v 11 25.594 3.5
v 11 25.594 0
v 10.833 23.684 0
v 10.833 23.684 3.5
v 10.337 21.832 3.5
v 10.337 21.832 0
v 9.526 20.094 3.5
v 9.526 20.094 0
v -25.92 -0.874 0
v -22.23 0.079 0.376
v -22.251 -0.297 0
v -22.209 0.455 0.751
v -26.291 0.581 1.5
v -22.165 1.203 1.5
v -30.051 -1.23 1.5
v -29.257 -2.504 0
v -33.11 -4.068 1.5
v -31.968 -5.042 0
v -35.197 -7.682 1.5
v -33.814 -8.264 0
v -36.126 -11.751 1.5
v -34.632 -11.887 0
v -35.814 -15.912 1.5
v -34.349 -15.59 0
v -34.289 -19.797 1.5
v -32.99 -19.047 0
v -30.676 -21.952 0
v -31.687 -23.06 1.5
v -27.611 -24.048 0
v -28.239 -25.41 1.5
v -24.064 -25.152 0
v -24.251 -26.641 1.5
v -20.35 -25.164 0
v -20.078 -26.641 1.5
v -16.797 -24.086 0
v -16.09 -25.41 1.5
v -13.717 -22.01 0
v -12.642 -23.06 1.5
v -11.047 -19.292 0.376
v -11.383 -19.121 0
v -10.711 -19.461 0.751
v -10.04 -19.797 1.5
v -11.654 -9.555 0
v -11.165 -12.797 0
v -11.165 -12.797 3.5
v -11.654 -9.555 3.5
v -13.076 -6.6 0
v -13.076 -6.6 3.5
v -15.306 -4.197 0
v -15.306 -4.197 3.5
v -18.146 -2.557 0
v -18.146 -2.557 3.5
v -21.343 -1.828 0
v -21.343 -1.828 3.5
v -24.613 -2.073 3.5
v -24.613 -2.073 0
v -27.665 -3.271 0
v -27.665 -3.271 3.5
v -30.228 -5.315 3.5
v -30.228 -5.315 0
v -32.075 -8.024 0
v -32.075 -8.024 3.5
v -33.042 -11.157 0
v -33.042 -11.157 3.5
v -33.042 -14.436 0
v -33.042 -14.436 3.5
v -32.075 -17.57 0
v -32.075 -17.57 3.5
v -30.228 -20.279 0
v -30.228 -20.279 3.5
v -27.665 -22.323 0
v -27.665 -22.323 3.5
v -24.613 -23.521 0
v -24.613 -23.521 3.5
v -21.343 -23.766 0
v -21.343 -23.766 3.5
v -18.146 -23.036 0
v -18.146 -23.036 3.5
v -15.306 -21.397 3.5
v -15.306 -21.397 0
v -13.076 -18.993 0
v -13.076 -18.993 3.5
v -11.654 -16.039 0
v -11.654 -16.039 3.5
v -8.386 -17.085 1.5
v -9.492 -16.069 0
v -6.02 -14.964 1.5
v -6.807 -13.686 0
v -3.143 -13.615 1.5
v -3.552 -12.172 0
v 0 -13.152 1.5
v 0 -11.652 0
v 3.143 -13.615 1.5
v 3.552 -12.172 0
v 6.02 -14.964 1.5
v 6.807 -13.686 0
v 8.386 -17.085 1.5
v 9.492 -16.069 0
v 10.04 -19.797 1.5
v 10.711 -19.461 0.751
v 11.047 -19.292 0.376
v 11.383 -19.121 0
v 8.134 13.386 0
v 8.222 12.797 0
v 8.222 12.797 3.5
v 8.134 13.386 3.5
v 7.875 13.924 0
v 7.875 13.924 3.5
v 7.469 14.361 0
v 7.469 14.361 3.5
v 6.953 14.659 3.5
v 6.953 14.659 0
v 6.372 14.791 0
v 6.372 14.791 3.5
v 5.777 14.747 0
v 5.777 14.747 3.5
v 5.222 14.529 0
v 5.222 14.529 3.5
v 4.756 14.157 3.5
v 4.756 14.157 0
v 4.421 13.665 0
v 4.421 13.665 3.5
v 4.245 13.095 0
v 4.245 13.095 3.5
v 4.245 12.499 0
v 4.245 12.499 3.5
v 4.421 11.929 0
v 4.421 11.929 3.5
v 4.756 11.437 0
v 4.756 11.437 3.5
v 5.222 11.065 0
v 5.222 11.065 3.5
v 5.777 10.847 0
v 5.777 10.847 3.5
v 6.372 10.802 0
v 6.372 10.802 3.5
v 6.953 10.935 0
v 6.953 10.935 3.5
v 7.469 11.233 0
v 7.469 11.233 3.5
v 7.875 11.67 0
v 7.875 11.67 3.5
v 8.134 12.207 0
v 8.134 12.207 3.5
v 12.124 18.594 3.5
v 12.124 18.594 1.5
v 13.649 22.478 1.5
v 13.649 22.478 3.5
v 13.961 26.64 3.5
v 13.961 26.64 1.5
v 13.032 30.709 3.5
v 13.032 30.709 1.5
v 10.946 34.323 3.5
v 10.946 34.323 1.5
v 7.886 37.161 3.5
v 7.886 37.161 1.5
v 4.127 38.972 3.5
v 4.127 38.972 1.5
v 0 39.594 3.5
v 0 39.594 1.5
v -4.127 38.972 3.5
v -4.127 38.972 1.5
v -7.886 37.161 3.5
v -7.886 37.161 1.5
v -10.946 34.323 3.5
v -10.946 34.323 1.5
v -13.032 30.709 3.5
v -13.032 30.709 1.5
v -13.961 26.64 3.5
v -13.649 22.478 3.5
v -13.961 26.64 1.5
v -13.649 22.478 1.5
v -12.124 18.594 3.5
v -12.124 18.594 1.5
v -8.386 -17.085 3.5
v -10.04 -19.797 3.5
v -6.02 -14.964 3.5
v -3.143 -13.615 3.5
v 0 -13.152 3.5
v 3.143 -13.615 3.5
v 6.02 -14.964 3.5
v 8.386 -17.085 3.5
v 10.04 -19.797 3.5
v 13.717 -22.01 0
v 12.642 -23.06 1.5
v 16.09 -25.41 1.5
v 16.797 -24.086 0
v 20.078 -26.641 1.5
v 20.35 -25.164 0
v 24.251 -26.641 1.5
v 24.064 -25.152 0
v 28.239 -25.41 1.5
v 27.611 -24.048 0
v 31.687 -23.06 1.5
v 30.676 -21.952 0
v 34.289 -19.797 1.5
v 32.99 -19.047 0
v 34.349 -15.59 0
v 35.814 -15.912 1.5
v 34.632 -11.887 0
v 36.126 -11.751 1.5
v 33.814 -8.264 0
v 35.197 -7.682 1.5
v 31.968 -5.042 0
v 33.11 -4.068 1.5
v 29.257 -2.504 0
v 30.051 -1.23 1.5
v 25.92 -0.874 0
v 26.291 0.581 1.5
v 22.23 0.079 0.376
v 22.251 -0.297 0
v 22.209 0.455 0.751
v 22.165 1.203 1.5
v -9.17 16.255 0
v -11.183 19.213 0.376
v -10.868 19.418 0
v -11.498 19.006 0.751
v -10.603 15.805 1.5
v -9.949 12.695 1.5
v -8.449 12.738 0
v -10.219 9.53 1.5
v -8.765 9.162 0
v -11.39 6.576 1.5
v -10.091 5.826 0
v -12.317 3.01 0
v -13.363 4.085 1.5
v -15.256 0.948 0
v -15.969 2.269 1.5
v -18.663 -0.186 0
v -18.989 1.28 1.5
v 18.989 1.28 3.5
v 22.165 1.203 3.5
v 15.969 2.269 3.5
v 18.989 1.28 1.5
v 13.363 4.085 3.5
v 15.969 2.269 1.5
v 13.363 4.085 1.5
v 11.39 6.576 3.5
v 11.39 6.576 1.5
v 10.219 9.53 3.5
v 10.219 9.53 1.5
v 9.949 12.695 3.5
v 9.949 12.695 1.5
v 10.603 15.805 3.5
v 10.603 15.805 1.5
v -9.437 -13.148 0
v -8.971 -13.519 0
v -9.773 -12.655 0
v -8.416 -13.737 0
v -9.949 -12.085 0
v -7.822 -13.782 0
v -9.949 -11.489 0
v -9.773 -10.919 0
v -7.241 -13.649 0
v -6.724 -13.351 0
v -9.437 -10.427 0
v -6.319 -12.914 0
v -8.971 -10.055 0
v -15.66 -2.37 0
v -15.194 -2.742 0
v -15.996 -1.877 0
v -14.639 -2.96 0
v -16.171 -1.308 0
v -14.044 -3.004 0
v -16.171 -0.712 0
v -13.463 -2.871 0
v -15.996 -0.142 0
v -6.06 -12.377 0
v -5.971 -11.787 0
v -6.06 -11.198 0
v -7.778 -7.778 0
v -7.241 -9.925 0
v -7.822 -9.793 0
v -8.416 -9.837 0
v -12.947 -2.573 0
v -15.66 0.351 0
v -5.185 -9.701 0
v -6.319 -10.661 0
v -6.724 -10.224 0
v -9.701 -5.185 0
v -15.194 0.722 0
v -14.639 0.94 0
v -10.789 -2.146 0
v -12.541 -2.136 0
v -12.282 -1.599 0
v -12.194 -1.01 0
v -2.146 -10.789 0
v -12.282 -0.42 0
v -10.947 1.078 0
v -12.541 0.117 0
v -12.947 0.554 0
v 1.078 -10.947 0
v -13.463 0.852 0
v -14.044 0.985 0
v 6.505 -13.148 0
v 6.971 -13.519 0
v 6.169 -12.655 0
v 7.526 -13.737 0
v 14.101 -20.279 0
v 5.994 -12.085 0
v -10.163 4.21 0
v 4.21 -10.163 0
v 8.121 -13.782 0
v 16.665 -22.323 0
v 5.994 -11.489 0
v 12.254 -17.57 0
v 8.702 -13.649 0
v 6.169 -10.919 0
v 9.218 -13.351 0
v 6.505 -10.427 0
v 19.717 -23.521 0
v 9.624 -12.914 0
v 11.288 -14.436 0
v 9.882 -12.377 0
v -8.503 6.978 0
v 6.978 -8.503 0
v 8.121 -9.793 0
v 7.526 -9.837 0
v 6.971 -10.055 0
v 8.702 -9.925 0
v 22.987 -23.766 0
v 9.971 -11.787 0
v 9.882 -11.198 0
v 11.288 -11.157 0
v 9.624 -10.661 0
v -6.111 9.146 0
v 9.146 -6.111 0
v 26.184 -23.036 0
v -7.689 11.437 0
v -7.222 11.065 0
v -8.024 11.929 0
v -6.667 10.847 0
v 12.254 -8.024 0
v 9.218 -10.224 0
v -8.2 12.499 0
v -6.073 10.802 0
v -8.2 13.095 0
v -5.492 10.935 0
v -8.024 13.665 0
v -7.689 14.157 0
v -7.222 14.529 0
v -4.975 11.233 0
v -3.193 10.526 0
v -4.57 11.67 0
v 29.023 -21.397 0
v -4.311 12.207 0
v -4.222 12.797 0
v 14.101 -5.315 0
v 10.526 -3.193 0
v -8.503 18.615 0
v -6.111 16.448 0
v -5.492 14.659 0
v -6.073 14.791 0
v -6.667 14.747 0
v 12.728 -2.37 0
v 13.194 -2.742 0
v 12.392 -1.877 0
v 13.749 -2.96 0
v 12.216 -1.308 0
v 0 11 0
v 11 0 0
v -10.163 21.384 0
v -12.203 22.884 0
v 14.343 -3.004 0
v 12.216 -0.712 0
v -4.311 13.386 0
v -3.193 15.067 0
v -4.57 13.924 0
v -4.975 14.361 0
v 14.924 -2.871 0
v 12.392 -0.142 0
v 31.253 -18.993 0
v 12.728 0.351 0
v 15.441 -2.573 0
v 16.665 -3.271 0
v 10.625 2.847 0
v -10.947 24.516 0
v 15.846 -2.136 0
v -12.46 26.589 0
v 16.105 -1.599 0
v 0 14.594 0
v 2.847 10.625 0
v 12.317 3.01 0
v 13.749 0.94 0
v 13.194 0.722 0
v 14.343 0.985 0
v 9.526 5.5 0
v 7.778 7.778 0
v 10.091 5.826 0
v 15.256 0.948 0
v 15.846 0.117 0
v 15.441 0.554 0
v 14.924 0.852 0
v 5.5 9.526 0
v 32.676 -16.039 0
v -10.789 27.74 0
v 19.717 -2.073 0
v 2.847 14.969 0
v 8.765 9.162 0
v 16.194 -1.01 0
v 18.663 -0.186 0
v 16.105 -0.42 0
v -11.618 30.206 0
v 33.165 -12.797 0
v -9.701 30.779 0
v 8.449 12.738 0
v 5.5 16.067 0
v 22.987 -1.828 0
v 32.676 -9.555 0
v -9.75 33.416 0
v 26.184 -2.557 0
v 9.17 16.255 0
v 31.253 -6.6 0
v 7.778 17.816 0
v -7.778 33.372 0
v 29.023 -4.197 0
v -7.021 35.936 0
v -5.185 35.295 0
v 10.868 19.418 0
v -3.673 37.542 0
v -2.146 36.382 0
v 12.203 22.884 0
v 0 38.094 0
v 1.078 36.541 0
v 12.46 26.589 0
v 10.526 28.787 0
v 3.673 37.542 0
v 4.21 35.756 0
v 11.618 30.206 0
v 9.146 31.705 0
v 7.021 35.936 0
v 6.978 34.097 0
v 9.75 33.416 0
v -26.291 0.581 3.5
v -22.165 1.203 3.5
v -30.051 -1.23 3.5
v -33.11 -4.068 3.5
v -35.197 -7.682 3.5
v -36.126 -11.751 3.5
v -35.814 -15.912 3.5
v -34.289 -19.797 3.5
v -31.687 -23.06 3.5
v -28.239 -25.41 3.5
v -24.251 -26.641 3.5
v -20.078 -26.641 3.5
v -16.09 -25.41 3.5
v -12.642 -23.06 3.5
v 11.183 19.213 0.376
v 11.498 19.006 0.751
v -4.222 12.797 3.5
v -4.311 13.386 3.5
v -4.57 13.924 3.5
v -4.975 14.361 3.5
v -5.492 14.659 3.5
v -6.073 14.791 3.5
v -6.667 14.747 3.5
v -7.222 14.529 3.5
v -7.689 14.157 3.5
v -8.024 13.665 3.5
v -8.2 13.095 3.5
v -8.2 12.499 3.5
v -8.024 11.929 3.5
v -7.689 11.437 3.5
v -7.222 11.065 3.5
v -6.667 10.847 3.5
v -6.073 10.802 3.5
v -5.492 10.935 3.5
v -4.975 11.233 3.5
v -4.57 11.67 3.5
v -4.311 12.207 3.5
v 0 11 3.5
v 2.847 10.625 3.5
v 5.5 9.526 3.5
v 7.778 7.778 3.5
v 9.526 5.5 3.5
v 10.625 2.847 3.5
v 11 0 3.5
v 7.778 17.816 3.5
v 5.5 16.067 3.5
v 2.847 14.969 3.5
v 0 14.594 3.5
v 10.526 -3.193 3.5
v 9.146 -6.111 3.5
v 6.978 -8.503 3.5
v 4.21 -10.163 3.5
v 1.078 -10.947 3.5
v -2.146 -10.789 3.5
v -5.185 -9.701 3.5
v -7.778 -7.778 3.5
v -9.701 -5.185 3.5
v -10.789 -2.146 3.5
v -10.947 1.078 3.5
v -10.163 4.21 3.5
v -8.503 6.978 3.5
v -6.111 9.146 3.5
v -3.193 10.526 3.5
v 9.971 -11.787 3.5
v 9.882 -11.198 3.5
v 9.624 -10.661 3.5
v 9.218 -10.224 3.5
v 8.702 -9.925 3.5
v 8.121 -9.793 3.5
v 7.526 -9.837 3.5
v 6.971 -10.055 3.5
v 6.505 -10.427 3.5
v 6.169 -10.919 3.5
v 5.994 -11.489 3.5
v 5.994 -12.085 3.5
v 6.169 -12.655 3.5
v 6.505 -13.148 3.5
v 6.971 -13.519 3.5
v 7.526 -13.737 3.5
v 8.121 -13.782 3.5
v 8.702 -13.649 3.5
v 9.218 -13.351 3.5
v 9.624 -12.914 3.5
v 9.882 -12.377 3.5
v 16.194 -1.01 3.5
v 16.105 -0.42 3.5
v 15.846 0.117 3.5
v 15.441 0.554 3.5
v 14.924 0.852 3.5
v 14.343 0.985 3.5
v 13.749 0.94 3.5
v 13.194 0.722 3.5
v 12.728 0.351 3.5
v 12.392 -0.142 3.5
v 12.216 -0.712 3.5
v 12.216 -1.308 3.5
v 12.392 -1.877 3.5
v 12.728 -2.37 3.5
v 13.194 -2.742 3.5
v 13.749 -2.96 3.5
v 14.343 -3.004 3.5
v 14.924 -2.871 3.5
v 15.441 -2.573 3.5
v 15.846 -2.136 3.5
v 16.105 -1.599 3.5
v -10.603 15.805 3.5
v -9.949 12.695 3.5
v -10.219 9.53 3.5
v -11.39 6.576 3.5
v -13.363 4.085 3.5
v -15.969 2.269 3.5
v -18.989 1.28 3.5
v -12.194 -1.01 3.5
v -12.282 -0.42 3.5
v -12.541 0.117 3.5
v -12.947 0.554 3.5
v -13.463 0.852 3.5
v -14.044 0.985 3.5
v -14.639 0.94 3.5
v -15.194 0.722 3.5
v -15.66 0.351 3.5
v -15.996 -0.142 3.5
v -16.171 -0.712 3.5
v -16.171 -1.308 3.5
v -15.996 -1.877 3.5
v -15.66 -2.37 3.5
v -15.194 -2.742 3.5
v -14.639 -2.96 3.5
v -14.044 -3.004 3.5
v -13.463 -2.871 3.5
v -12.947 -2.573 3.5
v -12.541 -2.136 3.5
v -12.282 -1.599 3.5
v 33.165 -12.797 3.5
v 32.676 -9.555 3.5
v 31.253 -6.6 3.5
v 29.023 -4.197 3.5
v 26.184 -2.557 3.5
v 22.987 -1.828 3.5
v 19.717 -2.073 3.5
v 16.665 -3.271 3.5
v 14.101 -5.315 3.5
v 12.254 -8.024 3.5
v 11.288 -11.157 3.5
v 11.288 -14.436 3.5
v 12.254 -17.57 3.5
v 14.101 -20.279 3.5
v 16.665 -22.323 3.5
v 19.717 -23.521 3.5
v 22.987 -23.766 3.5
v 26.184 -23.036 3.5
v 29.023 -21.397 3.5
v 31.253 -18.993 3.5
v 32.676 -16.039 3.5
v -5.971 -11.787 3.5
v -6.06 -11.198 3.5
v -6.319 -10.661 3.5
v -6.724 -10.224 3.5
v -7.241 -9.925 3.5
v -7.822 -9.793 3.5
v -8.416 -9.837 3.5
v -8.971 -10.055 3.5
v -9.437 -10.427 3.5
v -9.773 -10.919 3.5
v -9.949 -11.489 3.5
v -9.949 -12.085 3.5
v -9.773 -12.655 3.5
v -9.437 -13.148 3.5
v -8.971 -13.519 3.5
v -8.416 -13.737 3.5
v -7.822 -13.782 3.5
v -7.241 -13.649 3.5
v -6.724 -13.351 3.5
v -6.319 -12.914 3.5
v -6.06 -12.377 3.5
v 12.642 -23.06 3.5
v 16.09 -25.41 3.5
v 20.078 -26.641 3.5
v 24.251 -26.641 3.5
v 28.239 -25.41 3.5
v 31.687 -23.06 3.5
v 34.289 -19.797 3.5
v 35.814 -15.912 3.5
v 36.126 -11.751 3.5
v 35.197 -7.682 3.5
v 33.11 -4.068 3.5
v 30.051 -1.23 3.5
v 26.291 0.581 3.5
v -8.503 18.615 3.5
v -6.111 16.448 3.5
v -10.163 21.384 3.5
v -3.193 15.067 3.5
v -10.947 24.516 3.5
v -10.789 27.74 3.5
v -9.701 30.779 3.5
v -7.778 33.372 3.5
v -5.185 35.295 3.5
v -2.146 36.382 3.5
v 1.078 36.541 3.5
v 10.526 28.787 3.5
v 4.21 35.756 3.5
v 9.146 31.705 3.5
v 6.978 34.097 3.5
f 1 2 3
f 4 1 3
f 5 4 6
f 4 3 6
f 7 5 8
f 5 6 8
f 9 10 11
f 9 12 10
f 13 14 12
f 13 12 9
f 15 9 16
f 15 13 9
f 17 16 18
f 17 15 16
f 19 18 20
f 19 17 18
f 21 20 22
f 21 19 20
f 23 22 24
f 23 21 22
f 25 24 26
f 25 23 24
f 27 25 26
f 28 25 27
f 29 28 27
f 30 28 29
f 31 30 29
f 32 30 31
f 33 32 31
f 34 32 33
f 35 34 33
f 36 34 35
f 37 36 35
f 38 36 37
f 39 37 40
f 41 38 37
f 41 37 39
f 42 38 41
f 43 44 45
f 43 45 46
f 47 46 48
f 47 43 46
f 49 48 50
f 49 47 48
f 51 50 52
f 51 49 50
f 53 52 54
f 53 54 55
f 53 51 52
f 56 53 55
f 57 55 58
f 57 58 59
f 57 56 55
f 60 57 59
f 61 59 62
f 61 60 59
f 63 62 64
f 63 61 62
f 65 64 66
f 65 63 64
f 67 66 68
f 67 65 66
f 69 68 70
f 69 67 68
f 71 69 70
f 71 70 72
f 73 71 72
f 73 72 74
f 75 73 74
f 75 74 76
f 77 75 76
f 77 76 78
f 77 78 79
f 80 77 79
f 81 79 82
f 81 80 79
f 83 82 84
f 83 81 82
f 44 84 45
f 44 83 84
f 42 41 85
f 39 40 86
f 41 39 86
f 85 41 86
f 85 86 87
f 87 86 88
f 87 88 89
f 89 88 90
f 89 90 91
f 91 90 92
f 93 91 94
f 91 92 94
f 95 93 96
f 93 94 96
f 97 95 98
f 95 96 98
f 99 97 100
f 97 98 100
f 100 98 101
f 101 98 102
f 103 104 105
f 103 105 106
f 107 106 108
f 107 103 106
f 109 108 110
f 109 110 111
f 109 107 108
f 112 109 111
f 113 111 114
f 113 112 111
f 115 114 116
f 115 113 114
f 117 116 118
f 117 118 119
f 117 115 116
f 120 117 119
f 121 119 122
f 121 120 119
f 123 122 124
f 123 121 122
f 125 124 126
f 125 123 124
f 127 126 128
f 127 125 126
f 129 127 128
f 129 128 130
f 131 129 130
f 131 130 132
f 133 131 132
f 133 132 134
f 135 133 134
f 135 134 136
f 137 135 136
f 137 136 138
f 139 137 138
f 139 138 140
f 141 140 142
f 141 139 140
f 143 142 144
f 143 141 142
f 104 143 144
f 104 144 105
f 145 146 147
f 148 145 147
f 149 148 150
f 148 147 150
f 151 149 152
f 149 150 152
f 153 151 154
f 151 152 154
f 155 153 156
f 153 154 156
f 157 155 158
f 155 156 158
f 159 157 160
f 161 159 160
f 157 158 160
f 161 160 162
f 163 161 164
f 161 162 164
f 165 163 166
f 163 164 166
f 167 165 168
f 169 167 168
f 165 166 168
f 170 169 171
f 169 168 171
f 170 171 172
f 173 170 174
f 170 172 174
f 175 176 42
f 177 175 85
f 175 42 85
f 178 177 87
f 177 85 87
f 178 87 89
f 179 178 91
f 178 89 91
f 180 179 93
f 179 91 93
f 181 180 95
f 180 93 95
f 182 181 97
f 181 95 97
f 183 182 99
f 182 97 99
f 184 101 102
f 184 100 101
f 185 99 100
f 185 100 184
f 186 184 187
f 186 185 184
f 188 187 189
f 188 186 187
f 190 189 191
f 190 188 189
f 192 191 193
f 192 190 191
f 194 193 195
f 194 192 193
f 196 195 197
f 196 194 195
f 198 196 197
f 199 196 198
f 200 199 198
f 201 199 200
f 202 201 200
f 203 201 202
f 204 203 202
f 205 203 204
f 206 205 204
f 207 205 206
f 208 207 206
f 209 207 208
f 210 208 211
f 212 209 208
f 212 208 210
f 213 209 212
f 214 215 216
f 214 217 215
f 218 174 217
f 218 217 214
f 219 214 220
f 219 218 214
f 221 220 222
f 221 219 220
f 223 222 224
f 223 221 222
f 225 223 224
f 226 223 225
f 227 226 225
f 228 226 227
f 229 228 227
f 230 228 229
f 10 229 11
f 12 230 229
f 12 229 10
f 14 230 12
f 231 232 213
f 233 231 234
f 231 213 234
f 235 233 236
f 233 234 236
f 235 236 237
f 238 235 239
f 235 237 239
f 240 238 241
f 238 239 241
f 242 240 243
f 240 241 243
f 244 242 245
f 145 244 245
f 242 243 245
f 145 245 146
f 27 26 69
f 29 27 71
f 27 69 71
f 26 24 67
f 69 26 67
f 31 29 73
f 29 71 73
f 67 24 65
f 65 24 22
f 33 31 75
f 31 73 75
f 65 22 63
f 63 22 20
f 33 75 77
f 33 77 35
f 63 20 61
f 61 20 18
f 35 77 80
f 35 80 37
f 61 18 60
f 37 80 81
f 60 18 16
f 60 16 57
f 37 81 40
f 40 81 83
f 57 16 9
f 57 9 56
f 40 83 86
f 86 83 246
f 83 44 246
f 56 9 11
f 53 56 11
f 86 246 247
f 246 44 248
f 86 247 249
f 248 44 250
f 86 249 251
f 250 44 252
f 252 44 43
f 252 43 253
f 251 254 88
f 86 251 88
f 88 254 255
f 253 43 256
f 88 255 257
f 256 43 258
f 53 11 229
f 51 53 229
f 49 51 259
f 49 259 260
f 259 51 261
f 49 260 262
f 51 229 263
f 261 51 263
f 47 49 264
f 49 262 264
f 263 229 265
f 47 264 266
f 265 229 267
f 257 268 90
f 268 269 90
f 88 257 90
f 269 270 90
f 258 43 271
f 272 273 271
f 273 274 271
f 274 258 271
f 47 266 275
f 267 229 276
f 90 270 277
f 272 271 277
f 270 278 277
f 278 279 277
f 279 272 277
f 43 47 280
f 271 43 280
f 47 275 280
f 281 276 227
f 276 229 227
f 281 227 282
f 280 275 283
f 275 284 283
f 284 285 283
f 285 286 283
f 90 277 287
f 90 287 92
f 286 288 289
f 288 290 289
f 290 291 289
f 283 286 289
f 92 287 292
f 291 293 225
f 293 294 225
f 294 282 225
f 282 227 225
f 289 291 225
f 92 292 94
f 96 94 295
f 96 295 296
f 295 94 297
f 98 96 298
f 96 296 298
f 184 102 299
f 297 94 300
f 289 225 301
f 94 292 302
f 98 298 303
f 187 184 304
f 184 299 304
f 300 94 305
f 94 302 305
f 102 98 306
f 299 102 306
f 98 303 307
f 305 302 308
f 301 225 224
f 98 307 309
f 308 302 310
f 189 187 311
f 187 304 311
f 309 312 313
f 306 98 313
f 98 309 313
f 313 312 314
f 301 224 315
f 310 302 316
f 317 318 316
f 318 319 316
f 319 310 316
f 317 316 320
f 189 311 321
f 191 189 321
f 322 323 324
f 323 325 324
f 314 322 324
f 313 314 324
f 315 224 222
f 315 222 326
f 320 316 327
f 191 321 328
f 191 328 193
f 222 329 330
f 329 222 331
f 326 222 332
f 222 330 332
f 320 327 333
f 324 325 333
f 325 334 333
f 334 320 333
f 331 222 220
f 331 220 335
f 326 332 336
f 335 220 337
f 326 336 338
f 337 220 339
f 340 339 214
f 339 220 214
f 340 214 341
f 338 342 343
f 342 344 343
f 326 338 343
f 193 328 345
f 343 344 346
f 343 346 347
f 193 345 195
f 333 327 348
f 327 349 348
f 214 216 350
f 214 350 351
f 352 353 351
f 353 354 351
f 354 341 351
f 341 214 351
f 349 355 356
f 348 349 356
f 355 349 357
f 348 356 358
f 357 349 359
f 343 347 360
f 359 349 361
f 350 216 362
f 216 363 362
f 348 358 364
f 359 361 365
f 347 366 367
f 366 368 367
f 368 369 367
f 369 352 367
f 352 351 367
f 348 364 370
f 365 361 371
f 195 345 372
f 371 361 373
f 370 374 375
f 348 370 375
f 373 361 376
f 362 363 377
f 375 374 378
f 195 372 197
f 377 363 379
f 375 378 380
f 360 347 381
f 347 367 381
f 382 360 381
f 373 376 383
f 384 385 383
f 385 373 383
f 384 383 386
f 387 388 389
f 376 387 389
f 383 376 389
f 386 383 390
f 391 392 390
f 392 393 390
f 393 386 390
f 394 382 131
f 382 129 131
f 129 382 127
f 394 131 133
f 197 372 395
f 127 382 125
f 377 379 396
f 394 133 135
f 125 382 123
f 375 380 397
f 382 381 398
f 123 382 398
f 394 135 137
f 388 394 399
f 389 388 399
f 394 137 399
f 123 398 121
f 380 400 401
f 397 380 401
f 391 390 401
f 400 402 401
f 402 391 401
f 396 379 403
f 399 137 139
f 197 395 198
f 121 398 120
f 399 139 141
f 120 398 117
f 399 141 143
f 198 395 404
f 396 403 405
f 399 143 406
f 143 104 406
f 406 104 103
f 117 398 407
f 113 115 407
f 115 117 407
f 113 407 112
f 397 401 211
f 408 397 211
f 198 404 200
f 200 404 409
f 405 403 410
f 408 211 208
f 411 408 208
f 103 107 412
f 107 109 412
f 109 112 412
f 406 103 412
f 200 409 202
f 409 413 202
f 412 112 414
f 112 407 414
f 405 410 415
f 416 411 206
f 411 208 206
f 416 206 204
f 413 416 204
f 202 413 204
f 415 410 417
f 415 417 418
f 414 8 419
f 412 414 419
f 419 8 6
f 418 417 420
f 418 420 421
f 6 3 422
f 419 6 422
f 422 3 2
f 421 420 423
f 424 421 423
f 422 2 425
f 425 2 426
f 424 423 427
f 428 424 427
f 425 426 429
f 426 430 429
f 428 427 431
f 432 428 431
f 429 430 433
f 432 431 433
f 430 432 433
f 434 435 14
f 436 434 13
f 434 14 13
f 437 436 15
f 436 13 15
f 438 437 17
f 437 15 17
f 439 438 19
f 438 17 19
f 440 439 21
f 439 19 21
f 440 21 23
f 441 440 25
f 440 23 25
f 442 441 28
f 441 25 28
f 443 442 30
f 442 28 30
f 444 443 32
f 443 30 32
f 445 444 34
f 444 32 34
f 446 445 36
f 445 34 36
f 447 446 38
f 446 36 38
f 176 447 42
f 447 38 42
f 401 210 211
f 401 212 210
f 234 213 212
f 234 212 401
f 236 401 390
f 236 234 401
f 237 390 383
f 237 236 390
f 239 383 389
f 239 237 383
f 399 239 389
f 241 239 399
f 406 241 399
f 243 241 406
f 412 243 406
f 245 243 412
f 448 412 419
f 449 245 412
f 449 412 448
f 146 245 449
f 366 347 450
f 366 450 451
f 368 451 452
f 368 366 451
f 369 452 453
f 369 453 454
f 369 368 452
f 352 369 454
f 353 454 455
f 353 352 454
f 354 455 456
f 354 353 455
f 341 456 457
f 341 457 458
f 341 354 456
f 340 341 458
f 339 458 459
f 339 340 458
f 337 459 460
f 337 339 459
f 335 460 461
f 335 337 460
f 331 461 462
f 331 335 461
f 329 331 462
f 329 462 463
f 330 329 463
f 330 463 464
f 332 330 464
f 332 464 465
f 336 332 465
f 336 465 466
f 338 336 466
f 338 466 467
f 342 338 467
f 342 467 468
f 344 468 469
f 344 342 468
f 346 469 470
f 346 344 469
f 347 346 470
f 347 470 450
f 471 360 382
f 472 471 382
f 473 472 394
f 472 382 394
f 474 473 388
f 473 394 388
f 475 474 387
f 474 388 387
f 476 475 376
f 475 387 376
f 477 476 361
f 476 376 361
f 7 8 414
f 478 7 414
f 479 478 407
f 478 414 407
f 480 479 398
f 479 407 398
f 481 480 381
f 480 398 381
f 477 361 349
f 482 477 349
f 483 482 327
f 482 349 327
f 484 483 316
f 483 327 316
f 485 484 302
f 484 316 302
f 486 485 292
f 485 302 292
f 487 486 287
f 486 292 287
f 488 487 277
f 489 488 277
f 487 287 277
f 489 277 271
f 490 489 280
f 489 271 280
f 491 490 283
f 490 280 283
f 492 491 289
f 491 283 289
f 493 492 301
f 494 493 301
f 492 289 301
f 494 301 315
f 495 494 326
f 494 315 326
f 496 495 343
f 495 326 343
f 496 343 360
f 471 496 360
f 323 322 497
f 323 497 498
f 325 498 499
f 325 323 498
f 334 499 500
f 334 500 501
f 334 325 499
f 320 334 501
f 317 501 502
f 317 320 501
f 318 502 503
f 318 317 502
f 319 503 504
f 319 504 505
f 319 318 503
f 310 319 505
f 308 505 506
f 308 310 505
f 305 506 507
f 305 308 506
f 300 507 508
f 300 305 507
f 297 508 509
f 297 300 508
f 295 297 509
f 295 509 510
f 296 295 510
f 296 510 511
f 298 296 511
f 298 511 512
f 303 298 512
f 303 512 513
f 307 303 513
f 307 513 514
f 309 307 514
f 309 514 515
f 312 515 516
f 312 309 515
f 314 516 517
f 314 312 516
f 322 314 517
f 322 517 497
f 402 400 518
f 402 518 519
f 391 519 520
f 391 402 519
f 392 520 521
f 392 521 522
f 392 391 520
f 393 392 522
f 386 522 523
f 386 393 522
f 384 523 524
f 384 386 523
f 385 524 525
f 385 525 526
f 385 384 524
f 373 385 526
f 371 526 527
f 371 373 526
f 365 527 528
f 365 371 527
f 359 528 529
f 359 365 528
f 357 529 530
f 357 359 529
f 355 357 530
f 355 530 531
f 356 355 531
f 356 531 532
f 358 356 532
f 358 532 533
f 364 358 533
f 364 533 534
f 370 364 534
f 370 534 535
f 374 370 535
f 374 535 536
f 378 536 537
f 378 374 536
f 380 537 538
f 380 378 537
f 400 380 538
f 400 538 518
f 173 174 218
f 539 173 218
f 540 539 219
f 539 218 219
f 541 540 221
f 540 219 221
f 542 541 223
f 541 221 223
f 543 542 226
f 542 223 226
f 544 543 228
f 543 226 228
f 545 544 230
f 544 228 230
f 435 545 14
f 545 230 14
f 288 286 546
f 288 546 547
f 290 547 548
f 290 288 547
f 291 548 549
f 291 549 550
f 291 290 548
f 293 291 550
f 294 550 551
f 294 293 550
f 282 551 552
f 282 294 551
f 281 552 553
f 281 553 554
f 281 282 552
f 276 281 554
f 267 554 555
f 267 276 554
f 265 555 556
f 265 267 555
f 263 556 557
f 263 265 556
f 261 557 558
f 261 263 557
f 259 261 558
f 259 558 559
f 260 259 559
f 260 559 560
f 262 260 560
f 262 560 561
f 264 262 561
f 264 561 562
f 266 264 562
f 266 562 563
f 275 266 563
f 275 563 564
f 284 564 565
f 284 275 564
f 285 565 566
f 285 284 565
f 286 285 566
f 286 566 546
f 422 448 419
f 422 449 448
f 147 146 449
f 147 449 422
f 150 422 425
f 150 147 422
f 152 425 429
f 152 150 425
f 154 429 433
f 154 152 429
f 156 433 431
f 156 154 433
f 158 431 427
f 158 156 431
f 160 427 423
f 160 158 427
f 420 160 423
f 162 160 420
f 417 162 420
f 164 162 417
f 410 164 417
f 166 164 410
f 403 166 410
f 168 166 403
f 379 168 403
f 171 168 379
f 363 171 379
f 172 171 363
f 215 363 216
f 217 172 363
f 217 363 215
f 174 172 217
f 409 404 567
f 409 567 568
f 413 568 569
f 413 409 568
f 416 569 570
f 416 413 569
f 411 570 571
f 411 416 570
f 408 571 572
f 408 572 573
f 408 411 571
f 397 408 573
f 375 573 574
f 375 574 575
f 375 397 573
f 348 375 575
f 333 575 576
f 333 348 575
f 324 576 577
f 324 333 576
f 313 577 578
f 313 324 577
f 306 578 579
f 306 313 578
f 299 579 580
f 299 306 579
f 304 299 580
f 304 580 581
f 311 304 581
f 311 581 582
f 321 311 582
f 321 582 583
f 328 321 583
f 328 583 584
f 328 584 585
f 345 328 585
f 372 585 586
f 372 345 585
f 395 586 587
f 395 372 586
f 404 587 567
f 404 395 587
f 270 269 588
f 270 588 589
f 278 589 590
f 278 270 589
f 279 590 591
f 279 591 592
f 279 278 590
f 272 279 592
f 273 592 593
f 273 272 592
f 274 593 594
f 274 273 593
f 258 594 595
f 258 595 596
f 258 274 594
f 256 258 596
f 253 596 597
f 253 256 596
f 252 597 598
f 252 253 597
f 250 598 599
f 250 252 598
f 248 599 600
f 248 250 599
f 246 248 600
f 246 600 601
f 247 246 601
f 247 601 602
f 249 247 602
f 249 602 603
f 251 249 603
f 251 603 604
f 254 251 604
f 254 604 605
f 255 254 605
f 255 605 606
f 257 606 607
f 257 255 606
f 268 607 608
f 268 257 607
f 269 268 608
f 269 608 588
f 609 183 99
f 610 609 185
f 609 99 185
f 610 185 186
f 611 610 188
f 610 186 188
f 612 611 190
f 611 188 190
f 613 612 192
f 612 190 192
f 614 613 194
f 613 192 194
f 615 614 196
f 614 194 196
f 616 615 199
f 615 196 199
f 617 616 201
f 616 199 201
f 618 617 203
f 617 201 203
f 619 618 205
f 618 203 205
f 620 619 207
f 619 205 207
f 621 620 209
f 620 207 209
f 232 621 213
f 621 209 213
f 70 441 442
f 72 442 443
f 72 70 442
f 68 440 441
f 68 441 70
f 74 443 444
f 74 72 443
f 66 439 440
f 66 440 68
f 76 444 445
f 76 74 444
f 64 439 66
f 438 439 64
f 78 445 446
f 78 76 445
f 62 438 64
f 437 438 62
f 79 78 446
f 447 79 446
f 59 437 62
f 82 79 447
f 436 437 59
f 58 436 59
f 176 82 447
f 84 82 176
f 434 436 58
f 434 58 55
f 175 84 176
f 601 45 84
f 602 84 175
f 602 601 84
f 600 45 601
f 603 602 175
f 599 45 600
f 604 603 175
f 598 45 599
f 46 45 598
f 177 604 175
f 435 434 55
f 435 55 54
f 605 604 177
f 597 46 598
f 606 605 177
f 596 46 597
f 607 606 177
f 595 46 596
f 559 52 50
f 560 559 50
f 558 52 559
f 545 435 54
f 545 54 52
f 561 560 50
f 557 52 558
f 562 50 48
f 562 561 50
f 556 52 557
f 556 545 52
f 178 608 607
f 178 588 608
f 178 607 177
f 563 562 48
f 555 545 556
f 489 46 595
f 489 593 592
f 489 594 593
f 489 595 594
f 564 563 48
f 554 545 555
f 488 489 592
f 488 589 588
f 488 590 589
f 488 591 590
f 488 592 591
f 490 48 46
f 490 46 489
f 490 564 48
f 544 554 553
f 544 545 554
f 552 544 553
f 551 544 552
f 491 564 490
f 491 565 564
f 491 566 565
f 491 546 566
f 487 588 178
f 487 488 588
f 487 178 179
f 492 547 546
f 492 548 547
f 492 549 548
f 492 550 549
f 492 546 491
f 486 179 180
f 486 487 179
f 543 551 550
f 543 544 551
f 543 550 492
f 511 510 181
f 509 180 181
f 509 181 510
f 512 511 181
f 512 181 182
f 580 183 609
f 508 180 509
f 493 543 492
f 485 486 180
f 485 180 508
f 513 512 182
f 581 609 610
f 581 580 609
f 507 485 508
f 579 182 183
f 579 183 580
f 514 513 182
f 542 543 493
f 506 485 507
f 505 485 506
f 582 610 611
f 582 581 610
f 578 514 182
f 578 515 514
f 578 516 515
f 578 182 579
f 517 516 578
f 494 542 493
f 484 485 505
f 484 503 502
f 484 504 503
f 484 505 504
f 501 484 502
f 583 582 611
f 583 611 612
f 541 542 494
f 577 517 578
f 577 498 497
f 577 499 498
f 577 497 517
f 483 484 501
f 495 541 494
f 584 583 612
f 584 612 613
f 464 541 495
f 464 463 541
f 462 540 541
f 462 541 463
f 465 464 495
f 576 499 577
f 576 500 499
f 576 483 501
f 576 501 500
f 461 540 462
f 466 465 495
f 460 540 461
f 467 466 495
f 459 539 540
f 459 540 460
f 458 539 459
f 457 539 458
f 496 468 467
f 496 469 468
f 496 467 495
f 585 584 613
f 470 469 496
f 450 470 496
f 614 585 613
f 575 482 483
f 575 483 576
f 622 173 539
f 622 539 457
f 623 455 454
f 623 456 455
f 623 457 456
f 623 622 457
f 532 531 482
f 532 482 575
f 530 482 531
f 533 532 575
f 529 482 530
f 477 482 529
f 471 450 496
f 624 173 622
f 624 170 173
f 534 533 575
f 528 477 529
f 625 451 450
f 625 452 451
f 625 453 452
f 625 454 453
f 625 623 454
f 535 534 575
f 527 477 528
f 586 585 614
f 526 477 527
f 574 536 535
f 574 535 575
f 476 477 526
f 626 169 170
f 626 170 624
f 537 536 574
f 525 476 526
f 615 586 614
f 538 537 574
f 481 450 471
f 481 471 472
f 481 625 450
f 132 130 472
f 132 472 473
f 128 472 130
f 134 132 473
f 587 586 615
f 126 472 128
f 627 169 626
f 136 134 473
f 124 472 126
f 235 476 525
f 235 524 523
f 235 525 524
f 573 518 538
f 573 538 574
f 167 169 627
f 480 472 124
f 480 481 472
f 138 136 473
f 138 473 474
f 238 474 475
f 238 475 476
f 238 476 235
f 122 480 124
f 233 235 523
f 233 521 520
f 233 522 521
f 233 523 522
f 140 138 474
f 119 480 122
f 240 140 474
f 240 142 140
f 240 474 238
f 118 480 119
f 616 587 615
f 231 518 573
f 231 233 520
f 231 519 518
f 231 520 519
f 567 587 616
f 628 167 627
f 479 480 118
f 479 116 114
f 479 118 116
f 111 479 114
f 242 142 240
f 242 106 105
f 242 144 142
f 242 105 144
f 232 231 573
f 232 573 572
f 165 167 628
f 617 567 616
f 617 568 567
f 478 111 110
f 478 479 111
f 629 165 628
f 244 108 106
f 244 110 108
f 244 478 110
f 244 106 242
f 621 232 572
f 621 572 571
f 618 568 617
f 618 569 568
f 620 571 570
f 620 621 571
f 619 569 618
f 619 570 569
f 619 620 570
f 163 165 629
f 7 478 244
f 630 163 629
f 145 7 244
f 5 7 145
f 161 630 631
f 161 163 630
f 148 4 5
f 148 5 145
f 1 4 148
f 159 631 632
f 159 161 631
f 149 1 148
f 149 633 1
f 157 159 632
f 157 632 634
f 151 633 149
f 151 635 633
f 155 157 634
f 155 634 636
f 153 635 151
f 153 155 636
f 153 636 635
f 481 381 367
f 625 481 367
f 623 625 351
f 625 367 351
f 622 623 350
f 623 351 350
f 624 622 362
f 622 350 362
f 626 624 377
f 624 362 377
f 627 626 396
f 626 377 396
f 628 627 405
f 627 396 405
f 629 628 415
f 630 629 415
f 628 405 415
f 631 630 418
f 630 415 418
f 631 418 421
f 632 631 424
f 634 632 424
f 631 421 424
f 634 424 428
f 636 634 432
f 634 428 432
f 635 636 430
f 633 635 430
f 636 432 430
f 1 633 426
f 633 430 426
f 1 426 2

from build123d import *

# Parameters (mm, degrees)
F0_R       = 11
F0_R_2     = 2
F1_DEPTH   = 3.5
F2_C1_SIZE = 1.5
F2_C2_SIZE = 1.5
F2_C3_SIZE = 1.5
F2_C4_SIZE = 1.5
F2_C5_SIZE = 1.5
F2_C6_SIZE = 1.5


with BuildPart() as f1:
    # F0 (on Top) → F1 (new body)
    with BuildSketch(Plane.XY):
        with BuildLine():
            ThreePointArc((22.164837833, 1.2031249106), (11.390396953, 6.576248747), (12.124355653, 18.5937501788))
            ThreePointArc((12.124355653, 18.5937501788), (0, 39.5937501788), (-12.124355653, 18.5937501788))
            ThreePointArc((-12.124355653, 18.5937501788), (-11.390396953, 6.576248747), (-22.164837833, 1.2031249106))
            ThreePointArc((-22.164837833, 1.2031249106), (-34.2891934859, -19.7968750894), (-10.04048218, -19.7968750894))
            ThreePointArc((-10.04048218, -19.7968750894), (0, -13.152497494), (10.04048218, -19.7968750894))
            ThreePointArc((10.04048218, -19.7968750894), (34.2891934859, -19.7968750894), (22.164837833, 1.2031249106))
        make_face()
        with Locations((-22.164837833, -12.7968750894)):
            Circle(F0_R, mode=Mode.SUBTRACT)
        with Locations((-7.9711980778, -11.7872301109)):
            Circle(F0_R_2, mode=Mode.SUBTRACT)
        with Locations((-14.1936397552, -1.0096449785)):
            Circle(F0_R_2, mode=Mode.SUBTRACT)
        with Locations((7.9711980778, -11.7872301109)):
            Circle(F0_R_2, mode=Mode.SUBTRACT)
        with Locations((22.164837833, -12.7968750894)):
            Circle(F0_R, mode=Mode.SUBTRACT)
        with BuildLine():
            ThreePointArc((0, 11), (7.7781745931, 7.7781745931), (11, 0))
            ThreePointArc((11, 0), (-7.7781745931, -7.7781745931), (0, 11))
        make_face(mode=Mode.SUBTRACT)
        with Locations((14.1936397552, -1.0096449785)):
            Circle(F0_R_2, mode=Mode.SUBTRACT)
        with Locations((-6.2224416774, 12.7968750894)):
            Circle(F0_R_2, mode=Mode.SUBTRACT)
        with Locations((6.2224416774, 12.7968750894)):
            Circle(F0_R_2, mode=Mode.SUBTRACT)
        with BuildLine():
            ThreePointArc((9.5262794416, 20.0937501788), (5.5, 16.0674707372), (0, 14.5937501788))
            ThreePointArc((0, 14.5937501788), (-5.5, 16.0674707372), (-9.5262794416, 20.0937501788))
            ThreePointArc((-9.5262794416, 20.0937501788), (-2.8470094961, 36.218934268), (11, 25.5937501788))
            ThreePointArc((11, 25.5937501788), (10.6251840892, 22.7467406827), (9.5262794416, 20.0937501788))
        make_face(mode=Mode.SUBTRACT)
    extrude(amount=F1_DEPTH)

    # F2: chamfer of 1.5 on 6 edges, made by hand

    # F2_c1
    f2_c1_edges = [f1.edges().sort_by_distance(p)[0] for p in [
        (0, -13.152497494, 0),
    ]]
    chamfer(f2_c1_edges, length=F2_C1_SIZE)

    # F2_c2
    f2_c2_edges = [f1.edges().sort_by_distance(p)[0] for p in [
        (-11.390396953, 6.576248747, 0),
    ]]
    chamfer(f2_c2_edges, length=F2_C2_SIZE)

    # F2_c3
    f2_c3_edges = [f1.edges().sort_by_distance(p)[0] for p in [
        (11.390396953, 6.576248747, 0),
    ]]
    chamfer(f2_c3_edges, length=F2_C3_SIZE)

    # F2_c4
    f2_c4_edges = [f1.edges().sort_by_distance(p)[0] for p in [
        (34.2891934859, -19.7968750894, 0),
    ]]
    chamfer(f2_c4_edges, length=F2_C4_SIZE)

    # F2_c5
    f2_c5_edges = [f1.edges().sort_by_distance(p)[0] for p in [
        (-34.2891934859, -19.7968750894, 0),
    ]]
    chamfer(f2_c5_edges, length=F2_C5_SIZE)

    # F2_c6
    f2_c6_edges = [f1.edges().sort_by_distance(p)[0] for p in [
        (0, 39.5937501788, 0),
    ]]
    chamfer(f2_c6_edges, length=F2_C6_SIZE)


solid = f1.part
